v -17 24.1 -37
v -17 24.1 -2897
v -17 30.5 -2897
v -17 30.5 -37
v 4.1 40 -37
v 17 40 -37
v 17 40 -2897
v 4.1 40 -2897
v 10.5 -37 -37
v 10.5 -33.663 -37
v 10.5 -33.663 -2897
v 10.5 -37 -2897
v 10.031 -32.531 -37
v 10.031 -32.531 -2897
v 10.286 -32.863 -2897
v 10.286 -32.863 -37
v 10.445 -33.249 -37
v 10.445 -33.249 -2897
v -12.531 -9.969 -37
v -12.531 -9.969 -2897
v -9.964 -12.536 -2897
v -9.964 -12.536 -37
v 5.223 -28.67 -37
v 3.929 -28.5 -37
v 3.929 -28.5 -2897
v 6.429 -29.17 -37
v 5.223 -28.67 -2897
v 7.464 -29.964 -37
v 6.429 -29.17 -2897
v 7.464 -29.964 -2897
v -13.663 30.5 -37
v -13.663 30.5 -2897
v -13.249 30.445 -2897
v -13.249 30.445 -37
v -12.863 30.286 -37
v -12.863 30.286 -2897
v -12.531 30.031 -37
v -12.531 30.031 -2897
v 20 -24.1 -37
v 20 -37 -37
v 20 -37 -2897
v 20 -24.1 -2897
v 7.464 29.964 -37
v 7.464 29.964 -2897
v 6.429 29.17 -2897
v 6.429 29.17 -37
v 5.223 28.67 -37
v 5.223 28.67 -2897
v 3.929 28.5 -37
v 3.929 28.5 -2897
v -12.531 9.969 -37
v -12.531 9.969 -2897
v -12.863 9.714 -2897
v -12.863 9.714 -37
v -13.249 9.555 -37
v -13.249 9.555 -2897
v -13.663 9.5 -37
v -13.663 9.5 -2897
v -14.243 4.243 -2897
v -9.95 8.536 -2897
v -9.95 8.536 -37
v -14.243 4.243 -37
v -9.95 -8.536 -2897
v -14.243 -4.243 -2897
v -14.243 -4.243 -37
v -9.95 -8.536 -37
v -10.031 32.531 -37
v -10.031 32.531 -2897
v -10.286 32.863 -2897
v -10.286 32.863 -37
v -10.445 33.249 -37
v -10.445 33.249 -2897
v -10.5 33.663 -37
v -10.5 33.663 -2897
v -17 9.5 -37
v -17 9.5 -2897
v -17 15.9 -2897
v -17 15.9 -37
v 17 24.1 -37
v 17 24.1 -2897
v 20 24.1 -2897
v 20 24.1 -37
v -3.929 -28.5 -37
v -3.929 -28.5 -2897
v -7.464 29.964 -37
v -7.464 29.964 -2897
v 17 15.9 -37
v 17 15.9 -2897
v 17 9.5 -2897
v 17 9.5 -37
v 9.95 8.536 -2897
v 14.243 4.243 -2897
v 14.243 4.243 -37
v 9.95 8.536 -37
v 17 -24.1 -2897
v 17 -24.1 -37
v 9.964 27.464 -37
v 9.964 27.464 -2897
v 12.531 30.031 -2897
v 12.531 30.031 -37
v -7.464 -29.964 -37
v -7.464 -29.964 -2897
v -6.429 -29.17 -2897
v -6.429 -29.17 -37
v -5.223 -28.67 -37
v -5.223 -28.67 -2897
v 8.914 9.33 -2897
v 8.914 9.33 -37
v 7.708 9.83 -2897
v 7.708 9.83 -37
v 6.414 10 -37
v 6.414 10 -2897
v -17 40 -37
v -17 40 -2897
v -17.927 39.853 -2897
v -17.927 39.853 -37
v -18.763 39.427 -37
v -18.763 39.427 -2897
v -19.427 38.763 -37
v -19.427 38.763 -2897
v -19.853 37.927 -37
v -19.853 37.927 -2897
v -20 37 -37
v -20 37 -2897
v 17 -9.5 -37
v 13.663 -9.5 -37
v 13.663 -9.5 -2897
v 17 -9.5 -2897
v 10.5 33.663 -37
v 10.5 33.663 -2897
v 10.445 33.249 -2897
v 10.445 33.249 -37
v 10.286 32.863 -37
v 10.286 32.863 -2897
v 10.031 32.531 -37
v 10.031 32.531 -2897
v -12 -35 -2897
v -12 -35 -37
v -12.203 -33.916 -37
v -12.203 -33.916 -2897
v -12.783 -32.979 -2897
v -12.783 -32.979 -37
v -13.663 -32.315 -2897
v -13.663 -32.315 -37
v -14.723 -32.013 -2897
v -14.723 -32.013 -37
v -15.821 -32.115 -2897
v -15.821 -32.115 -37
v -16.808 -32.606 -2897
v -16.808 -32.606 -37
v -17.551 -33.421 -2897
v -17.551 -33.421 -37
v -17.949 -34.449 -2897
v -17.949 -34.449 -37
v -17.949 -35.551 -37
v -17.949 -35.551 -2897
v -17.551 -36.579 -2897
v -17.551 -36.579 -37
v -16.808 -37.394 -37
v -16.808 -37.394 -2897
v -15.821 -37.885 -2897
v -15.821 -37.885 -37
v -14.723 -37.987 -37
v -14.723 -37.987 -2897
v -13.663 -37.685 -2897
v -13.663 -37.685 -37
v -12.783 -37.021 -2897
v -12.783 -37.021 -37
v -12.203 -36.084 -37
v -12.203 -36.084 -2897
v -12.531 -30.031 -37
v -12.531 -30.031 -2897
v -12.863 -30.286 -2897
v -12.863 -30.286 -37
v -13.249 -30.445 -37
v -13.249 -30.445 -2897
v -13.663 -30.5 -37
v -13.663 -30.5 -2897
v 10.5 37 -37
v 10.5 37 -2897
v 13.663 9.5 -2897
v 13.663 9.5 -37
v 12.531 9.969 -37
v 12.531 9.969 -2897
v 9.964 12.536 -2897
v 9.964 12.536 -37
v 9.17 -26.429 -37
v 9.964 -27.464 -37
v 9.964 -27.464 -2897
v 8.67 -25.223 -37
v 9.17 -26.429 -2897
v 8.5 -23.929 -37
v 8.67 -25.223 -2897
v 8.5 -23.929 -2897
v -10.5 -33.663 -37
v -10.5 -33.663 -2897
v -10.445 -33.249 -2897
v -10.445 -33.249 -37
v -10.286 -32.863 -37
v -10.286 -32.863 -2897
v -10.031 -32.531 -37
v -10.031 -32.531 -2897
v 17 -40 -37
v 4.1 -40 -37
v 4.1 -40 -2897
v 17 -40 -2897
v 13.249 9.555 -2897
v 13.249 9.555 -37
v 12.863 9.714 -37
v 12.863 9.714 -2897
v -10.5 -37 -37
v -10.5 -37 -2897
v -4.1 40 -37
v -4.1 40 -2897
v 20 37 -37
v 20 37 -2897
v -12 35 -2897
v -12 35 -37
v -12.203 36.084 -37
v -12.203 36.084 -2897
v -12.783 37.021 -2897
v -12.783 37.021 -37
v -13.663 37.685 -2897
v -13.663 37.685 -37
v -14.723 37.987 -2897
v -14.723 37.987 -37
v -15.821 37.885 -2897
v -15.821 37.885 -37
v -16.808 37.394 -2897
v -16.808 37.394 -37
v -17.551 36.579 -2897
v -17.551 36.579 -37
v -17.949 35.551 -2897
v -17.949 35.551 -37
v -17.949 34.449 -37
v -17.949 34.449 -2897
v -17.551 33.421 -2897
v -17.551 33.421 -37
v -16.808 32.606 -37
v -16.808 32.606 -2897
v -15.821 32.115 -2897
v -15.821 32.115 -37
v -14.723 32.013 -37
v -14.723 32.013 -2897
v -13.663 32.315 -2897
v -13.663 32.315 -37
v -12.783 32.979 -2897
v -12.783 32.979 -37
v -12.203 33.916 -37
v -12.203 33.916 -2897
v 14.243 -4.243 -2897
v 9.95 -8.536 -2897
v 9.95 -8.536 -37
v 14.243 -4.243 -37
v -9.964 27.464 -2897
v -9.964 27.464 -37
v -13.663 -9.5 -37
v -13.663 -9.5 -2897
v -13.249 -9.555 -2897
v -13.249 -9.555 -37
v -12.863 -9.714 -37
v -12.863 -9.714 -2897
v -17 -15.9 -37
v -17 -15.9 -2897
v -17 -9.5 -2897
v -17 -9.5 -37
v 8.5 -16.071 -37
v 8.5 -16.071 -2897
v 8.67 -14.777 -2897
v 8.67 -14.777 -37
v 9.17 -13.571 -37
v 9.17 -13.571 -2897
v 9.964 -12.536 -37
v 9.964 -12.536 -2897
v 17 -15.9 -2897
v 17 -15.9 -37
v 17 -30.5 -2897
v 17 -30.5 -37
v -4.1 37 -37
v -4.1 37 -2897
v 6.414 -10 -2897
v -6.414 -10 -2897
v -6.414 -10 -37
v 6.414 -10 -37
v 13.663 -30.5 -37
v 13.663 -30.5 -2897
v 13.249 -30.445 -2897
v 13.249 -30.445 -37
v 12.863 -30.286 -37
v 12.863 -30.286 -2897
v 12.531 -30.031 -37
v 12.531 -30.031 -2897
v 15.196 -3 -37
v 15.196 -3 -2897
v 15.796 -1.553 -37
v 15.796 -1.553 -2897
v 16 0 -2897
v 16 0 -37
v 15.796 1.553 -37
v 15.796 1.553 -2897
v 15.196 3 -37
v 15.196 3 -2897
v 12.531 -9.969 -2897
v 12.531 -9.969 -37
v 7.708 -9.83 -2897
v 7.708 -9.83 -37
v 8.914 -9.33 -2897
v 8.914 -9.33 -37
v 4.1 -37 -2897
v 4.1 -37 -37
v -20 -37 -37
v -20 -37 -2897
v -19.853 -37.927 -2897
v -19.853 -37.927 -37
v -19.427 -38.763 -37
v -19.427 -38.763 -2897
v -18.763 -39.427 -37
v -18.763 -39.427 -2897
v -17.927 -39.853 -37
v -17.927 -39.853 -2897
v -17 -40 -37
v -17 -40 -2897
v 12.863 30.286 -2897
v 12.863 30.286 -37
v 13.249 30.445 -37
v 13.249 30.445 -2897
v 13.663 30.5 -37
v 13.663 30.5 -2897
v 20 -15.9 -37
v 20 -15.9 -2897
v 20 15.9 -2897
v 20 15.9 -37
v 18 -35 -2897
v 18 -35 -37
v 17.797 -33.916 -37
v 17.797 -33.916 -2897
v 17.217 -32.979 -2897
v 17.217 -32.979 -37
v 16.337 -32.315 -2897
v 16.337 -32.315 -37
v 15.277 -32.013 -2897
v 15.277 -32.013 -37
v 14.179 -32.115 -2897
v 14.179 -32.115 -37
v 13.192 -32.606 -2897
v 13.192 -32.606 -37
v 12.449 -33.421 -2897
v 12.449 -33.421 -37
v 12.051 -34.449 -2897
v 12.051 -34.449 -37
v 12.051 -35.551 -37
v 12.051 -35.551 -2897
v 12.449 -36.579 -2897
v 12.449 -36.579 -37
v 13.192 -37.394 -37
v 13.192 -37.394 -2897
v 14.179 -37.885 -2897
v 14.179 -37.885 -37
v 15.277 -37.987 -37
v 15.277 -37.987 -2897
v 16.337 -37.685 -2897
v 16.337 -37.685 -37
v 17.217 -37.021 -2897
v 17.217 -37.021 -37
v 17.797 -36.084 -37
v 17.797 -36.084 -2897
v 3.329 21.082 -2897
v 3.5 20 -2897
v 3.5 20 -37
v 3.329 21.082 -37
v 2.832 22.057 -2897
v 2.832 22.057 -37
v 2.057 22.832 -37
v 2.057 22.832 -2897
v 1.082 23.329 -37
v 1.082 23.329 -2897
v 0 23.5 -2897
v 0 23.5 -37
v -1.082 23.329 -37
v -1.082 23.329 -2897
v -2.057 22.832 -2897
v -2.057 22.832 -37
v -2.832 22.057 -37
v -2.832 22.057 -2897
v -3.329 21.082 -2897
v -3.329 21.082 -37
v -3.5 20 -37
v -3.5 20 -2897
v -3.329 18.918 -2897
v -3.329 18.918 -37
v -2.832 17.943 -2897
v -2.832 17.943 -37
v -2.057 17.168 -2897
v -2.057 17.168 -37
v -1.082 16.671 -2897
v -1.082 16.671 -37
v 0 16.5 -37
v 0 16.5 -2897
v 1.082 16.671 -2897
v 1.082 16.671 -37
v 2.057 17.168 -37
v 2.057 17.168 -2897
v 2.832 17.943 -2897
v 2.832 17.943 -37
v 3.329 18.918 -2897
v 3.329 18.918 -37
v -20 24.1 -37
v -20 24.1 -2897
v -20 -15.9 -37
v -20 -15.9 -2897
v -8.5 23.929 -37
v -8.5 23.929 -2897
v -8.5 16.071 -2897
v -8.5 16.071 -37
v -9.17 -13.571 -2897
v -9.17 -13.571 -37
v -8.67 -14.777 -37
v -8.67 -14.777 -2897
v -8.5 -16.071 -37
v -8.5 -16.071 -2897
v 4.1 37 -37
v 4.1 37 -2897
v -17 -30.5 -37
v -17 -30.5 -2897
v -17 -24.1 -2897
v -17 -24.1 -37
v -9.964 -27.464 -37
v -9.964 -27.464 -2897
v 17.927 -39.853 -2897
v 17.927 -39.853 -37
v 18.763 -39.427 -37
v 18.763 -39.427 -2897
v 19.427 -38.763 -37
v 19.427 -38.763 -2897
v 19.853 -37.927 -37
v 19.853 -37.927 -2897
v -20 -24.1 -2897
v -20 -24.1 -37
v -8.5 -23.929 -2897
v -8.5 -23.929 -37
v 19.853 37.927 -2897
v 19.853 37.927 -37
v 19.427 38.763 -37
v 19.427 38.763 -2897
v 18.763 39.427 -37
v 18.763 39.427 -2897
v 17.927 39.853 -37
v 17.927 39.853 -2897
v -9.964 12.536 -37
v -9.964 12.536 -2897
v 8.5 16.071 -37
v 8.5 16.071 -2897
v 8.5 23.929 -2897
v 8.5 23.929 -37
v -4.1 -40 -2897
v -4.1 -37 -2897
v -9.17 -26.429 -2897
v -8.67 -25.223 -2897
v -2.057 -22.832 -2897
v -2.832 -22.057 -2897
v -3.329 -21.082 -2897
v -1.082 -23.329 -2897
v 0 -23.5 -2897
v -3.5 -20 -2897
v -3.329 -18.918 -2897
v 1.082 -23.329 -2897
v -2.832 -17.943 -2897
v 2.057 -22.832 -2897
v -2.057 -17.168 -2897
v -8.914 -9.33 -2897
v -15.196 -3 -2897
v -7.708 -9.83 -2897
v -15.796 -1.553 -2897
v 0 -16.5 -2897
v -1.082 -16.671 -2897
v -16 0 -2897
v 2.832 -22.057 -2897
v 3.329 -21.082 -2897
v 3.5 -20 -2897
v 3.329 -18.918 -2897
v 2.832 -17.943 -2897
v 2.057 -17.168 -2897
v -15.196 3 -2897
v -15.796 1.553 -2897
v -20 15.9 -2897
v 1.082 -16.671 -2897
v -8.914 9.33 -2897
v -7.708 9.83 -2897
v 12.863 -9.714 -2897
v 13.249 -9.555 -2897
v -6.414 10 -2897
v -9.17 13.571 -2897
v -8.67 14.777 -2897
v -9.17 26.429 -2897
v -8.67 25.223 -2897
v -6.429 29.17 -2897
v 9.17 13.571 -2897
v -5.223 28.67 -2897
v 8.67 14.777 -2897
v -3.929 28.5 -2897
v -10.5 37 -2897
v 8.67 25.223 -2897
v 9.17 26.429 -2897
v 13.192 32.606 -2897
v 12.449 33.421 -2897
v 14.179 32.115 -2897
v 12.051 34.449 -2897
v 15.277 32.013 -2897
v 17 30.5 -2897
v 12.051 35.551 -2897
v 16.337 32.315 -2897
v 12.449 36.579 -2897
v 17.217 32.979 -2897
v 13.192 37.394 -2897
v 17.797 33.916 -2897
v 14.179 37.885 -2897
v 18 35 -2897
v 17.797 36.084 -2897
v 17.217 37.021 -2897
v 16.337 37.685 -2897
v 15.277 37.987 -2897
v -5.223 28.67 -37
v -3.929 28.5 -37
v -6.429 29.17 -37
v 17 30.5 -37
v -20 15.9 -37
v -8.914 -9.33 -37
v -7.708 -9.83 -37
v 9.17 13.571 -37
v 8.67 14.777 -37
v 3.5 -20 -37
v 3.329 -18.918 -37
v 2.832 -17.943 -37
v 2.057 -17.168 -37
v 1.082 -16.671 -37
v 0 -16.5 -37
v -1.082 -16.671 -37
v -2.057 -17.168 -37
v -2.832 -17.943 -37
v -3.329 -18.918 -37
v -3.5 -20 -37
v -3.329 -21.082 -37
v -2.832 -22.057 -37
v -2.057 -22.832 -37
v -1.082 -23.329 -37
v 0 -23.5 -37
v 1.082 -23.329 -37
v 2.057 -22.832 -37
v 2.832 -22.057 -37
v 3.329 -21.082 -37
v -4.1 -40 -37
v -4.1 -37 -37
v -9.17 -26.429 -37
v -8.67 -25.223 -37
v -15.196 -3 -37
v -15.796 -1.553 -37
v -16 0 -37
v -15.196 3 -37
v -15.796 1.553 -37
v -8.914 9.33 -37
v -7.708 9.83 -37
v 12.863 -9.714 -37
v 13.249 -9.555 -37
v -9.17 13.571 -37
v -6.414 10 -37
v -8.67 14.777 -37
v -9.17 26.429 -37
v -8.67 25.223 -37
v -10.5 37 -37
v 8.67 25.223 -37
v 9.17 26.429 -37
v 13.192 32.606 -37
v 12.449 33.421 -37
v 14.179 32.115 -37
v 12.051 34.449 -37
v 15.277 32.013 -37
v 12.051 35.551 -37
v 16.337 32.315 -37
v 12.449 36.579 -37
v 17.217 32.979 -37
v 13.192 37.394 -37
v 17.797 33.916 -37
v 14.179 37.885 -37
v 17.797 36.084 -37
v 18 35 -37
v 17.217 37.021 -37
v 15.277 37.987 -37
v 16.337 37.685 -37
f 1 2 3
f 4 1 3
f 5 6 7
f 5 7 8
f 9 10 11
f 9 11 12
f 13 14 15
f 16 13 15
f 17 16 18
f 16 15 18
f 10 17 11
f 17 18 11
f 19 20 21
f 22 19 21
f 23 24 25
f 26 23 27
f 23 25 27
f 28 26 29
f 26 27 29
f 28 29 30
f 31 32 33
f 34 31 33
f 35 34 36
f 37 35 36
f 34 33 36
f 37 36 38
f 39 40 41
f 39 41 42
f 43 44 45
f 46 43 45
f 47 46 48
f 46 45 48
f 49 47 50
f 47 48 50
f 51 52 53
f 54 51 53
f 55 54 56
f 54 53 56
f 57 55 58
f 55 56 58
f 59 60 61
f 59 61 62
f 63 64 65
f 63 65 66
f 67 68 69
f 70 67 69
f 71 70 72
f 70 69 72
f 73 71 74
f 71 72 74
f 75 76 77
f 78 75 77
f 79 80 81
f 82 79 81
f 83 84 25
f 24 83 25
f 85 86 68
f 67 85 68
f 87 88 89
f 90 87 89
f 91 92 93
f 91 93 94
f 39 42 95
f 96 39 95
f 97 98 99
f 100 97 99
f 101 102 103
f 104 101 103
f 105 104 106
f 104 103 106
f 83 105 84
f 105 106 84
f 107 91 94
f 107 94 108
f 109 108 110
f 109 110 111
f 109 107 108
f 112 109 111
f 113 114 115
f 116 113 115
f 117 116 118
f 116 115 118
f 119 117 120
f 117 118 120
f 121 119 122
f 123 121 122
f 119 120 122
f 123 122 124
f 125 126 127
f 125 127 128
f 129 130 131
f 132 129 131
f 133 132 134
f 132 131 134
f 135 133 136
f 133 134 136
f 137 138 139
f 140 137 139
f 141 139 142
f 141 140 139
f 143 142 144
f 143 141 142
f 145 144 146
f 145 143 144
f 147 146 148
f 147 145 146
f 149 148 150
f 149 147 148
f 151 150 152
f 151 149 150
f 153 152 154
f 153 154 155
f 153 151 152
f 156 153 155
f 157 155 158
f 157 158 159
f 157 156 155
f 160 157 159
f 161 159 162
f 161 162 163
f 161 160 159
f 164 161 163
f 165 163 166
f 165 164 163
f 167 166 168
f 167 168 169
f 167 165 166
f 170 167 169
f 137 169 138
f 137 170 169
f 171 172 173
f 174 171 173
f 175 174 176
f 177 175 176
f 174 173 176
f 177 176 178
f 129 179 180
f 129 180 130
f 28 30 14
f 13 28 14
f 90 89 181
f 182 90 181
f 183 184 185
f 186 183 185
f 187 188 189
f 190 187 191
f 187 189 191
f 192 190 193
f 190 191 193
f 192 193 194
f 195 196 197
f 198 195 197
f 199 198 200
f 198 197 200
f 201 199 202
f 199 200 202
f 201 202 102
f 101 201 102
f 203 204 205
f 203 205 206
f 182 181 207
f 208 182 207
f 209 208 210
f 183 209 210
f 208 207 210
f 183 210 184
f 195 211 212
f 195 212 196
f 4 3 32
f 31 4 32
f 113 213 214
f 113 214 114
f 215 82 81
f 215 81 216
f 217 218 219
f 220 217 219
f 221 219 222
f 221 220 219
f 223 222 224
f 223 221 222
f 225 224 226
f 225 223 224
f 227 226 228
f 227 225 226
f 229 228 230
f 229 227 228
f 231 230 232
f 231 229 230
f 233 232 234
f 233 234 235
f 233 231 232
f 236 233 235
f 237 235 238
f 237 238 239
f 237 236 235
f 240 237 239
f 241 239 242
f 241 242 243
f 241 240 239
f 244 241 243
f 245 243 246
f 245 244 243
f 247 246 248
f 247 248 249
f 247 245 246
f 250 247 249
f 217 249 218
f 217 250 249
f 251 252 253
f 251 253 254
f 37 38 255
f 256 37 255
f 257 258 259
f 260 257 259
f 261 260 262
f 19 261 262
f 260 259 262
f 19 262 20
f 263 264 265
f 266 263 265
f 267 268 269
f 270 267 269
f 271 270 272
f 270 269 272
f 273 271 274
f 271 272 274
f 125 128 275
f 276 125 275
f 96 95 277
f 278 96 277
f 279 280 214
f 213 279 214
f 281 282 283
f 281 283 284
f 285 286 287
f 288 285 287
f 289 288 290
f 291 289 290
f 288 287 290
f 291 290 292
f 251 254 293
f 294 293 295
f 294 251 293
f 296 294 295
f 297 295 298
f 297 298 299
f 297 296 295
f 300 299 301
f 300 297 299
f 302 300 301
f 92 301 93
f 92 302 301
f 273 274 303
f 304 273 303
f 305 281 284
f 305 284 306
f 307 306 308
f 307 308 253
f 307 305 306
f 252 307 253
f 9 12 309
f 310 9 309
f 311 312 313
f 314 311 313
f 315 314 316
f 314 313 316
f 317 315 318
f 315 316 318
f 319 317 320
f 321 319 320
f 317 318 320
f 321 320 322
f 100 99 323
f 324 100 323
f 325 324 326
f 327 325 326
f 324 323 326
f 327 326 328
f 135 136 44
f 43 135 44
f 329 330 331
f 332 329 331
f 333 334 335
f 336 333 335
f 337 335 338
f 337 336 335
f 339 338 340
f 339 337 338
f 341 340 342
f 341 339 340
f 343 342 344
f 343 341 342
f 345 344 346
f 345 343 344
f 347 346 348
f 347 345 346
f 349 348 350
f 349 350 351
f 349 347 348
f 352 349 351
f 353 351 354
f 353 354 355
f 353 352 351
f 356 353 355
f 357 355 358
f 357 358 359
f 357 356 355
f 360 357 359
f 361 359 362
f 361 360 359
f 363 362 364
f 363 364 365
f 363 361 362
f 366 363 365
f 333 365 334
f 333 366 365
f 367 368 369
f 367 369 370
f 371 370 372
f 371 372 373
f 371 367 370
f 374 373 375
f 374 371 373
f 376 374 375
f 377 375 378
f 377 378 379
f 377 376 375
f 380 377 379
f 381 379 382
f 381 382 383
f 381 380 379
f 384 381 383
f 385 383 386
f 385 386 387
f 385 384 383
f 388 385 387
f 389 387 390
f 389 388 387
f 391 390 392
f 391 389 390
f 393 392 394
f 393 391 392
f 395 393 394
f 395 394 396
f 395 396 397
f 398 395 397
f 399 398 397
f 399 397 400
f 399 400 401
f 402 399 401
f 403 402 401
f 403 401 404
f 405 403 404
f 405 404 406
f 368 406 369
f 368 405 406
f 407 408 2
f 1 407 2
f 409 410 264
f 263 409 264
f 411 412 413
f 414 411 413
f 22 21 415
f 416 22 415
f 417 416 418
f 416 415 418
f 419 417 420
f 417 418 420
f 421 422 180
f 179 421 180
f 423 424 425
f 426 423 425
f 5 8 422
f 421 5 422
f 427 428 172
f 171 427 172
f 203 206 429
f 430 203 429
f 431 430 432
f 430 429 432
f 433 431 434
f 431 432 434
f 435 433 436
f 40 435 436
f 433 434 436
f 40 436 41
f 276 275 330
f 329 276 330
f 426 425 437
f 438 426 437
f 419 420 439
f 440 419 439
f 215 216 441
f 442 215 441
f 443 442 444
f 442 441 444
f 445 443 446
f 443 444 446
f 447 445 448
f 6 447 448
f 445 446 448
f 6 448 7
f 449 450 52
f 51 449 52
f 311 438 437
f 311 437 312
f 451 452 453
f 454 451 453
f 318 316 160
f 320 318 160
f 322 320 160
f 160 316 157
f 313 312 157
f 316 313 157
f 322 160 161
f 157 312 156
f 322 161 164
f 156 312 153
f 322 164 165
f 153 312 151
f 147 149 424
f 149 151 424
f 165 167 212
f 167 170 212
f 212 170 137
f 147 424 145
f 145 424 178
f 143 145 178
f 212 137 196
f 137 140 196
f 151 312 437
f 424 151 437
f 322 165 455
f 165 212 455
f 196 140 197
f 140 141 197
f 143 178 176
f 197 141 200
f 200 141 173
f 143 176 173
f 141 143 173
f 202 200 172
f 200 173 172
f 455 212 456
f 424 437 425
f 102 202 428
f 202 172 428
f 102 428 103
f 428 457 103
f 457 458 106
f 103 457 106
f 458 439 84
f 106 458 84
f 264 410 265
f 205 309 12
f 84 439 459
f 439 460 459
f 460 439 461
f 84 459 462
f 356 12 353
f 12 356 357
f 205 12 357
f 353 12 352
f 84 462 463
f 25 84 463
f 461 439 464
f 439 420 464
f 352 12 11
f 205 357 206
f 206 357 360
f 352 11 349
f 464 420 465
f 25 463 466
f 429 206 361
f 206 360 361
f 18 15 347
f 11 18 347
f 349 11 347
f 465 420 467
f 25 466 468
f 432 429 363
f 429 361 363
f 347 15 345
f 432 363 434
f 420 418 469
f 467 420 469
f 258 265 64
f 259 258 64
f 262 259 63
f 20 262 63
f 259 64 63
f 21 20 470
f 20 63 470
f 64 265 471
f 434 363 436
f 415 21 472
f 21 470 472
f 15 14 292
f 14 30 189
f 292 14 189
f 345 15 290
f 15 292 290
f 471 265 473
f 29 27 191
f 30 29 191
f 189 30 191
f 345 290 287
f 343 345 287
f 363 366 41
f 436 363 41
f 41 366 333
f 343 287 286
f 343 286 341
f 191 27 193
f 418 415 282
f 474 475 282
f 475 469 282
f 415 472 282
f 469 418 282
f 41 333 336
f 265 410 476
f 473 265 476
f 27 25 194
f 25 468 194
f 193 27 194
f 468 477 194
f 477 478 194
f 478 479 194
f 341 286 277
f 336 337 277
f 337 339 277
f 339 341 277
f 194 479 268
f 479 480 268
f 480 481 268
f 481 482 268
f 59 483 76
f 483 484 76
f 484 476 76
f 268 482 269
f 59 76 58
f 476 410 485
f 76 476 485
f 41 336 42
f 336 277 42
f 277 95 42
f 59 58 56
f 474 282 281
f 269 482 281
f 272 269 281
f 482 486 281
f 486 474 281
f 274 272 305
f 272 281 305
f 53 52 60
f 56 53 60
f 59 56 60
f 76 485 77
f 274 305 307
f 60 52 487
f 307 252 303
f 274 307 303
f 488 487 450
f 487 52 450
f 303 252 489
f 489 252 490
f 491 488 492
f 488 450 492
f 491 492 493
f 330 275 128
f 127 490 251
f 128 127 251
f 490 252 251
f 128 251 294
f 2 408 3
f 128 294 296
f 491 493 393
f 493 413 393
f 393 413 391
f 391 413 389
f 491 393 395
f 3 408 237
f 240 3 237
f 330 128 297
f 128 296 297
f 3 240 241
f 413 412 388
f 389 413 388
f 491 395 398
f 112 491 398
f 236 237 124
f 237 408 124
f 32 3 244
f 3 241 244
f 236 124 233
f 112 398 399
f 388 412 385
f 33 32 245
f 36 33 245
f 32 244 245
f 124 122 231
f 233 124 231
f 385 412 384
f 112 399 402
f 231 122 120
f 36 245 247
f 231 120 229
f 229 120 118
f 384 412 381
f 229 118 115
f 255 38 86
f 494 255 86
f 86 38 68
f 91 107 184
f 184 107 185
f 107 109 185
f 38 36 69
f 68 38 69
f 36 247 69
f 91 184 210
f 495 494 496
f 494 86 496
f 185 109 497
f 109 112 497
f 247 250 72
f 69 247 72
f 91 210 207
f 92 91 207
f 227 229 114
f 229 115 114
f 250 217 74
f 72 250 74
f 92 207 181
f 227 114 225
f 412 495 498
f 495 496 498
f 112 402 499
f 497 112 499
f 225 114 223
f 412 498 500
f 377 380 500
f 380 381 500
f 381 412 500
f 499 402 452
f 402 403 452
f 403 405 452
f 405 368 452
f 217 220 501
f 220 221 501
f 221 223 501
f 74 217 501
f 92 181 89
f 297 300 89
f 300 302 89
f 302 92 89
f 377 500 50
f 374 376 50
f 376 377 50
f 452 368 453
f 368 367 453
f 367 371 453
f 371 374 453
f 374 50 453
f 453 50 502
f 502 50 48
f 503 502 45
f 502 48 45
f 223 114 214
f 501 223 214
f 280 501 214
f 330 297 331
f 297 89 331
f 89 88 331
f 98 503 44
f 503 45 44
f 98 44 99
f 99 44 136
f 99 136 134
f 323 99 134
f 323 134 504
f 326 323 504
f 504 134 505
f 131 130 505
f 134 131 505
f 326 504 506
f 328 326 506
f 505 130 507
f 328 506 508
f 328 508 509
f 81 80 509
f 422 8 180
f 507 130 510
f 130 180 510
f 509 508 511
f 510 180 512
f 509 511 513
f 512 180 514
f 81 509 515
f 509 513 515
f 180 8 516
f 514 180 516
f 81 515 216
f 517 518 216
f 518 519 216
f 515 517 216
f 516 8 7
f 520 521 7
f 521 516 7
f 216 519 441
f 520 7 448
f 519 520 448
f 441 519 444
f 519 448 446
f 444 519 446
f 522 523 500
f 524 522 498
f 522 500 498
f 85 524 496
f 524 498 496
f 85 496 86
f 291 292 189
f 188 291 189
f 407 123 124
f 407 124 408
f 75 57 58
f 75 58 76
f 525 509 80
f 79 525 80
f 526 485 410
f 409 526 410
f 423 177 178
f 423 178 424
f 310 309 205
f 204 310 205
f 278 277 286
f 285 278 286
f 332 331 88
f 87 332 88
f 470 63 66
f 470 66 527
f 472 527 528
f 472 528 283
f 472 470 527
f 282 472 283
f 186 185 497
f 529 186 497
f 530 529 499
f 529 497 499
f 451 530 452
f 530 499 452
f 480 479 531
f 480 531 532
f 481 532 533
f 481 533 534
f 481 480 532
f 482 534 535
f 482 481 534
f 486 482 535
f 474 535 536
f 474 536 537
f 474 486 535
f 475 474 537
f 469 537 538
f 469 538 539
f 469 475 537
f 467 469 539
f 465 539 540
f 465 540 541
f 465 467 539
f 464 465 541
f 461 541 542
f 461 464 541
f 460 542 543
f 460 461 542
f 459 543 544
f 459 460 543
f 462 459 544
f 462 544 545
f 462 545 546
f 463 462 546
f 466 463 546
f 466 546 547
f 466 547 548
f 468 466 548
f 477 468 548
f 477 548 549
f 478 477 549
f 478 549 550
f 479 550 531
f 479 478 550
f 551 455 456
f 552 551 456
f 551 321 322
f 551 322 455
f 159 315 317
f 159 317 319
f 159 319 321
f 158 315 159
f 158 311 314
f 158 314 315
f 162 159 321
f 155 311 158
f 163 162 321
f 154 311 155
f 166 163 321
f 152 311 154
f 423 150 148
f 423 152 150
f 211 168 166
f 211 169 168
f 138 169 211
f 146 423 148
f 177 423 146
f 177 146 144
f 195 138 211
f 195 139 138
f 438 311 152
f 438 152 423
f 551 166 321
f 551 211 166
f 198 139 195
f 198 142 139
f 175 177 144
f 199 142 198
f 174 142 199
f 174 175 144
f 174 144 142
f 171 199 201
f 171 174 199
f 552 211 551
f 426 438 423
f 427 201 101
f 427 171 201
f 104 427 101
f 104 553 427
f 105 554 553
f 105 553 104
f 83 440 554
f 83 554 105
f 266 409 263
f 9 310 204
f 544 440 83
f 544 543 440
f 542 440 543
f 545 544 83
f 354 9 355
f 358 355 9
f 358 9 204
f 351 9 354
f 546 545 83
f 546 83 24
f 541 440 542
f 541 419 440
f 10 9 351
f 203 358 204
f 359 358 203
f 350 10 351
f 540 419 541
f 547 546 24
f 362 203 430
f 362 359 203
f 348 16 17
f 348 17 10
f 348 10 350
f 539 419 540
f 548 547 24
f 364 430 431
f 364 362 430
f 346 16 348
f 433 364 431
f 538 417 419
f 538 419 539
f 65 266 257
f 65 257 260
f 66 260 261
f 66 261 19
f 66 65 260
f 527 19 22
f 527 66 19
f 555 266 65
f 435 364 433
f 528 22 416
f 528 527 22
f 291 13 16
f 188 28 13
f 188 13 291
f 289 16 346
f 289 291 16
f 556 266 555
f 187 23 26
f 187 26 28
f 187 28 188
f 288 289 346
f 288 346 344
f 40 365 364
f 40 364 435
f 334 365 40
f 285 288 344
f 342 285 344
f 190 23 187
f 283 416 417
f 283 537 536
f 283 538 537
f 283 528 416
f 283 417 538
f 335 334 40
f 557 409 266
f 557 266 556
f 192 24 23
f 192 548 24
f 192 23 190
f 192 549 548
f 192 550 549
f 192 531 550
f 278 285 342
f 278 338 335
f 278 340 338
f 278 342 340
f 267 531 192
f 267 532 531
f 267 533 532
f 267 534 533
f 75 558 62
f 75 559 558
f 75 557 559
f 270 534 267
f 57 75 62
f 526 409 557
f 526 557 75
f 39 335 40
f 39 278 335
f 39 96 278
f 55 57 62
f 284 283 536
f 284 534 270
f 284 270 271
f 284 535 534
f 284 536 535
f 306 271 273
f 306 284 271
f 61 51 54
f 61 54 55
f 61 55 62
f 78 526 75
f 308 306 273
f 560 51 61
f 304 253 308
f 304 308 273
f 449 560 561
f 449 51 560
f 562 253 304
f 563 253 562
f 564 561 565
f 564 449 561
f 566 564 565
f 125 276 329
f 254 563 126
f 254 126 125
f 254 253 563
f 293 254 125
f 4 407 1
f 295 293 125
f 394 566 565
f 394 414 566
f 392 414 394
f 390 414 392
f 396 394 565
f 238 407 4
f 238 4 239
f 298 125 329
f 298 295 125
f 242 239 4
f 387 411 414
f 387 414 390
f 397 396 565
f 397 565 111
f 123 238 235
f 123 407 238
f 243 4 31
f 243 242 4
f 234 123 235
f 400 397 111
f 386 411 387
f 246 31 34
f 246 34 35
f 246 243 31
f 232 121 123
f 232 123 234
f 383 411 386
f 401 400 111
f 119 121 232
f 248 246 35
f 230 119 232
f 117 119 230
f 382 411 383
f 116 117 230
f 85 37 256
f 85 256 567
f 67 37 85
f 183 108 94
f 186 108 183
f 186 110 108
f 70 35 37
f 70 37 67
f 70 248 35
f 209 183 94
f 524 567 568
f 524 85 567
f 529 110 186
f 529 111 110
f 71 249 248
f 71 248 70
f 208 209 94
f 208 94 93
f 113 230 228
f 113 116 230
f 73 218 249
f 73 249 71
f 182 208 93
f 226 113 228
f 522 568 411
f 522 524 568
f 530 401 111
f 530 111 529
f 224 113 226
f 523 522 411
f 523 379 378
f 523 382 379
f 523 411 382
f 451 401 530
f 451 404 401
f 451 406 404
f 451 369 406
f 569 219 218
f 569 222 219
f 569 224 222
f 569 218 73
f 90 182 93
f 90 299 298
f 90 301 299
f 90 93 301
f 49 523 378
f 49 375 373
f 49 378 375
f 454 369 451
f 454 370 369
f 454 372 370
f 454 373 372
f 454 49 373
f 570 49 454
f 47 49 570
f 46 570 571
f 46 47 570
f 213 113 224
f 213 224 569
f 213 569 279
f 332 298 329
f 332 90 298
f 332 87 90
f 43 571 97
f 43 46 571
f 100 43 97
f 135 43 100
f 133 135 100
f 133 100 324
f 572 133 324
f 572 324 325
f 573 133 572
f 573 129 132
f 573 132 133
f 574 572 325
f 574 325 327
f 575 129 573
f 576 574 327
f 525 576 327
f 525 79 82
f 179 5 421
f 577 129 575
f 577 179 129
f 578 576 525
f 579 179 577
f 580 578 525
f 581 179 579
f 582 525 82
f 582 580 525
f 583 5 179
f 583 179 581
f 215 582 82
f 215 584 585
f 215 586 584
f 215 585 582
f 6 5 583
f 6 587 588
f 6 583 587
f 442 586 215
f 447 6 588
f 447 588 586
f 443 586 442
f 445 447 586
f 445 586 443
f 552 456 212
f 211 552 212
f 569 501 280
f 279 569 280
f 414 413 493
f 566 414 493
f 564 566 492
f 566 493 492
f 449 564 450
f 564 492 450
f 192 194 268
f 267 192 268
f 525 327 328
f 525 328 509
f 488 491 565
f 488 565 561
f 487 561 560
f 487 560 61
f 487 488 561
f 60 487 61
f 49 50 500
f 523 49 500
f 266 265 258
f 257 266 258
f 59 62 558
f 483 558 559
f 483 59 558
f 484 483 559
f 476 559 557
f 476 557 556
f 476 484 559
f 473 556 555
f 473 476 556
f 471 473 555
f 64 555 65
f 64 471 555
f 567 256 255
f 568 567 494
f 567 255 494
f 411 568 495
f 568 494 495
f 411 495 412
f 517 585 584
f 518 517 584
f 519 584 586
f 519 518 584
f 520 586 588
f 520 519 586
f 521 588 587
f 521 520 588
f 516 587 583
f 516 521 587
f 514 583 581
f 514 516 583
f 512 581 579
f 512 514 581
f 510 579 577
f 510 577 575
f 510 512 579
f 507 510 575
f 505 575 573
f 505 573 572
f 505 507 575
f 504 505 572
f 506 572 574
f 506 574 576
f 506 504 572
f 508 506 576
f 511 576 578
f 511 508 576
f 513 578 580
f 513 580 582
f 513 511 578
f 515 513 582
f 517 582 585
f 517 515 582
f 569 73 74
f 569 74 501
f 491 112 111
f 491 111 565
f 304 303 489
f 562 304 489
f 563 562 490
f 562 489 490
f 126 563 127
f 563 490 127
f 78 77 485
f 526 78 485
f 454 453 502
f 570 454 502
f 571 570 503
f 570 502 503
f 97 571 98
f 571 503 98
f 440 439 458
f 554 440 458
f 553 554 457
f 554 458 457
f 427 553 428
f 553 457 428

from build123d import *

# Parameters (mm, degrees)
SKETCH1_R           = 3
SKETCH1_R_2         = 3.5
BOSS_EXTRUDE1_DEPTH = 2860


with BuildPart() as part:
    # Sketch1 → Boss-Extrude1 (new body)
    with BuildSketch(Plane.XY.offset(-2897)):
        with BuildLine():
            Line((-17, -40), (-4.1, -40))
            Line((-4.1, -40), (-4.1, -37))
            Line((-4.1, -37), (-10.5, -37))
            Line((-10.5, -37), (-10.5, -33.6627417))
            ThreePointArc((-10.5, -33.6627417), (-10.378207252, -33.050448208), (-10.03137085, -32.53137085))
            Line((-10.03137085, -32.53137085), (-7.464466094, -29.964466094))
            ThreePointArc((-7.464466094, -29.964466094), (-5.84234935, -28.880602337), (-3.928932188, -28.5))
            Line((-3.928932188, -28.5), (3.928932188, -28.5))
            ThreePointArc((3.928932188, -28.5), (5.84234935, -28.880602337), (7.464466094, -29.964466094))
            Line((7.464466094, -29.964466094), (10.03137085, -32.53137085))
            ThreePointArc((10.03137085, -32.53137085), (10.378207252, -33.050448208), (10.5, -33.6627417))
            Line((10.5, -33.6627417), (10.5, -37))
            Line((10.5, -37), (4.1, -37))
            Line((4.1, -37), (4.1, -40))
            Line((4.1, -40), (17, -40))
            ThreePointArc((17, -40), (19.121320344, -39.121320344), (20, -37))
            Line((20, -37), (20, -24.1))
            Line((20, -24.1), (17, -24.1))
            Line((17, -24.1), (17, -30.5))
            Line((17, -30.5), (13.6627417, -30.5))
            ThreePointArc((13.6627417, -30.5), (13.050448208, -30.378207252), (12.53137085, -30.03137085))
            Line((12.53137085, -30.03137085), (9.964466094, -27.464466094))
            ThreePointArc((9.964466094, -27.464466094), (8.880602337, -25.84234935), (8.5, -23.928932188))
            Line((8.5, -23.928932188), (8.5, -16.071067812))
            ThreePointArc((8.5, -16.071067812), (8.880602337, -14.15765065), (9.964466094, -12.535533906))
            Line((9.964466094, -12.535533906), (12.53137085, -9.96862915))
            ThreePointArc((12.53137085, -9.96862915), (13.050448208, -9.621792748), (13.6627417, -9.5))
            Line((13.6627417, -9.5), (17, -9.5))
            Line((17, -9.5), (17, -15.9))
            Line((17, -15.9), (20, -15.9))
            Line((20, -15.9), (20, 15.9))
            Line((20, 15.9), (17, 15.9))
            Line((17, 15.9), (17, 9.5))
            Line((17, 9.5), (13.6627417, 9.5))
            ThreePointArc((13.6627417, 9.5), (13.050448208, 9.621792748), (12.53137085, 9.96862915))
            Line((12.53137085, 9.96862915), (9.964466094, 12.535533906))
            ThreePointArc((9.964466094, 12.535533906), (8.880602337, 14.15765065), (8.5, 16.071067812))
            Line((8.5, 16.071067812), (8.5, 23.928932188))
            ThreePointArc((8.5, 23.928932188), (8.880602337, 25.84234935), (9.964466094, 27.464466094))
            Line((9.964466094, 27.464466094), (12.53137085, 30.03137085))
            ThreePointArc((12.53137085, 30.03137085), (13.050448208, 30.378207252), (13.6627417, 30.5))
            Line((13.6627417, 30.5), (17, 30.5))
            Line((17, 30.5), (17, 24.1))
            Line((17, 24.1), (20, 24.1))
            Line((20, 24.1), (20, 37))
            ThreePointArc((20, 37), (19.121320344, 39.121320344), (17, 40))
            Line((17, 40), (4.1, 40))
            Line((4.1, 40), (4.1, 37))
            Line((4.1, 37), (10.5, 37))
            Line((10.5, 37), (10.5, 33.6627417))
            ThreePointArc((10.5, 33.6627417), (10.378207252, 33.050448208), (10.03137085, 32.53137085))
            Line((10.03137085, 32.53137085), (7.464466094, 29.964466094))
            ThreePointArc((7.464466094, 29.964466094), (5.84234935, 28.880602337), (3.928932188, 28.5))
            Line((3.928932188, 28.5), (-3.928932188, 28.5))
            ThreePointArc((-3.928932188, 28.5), (-5.84234935, 28.880602337), (-7.464466094, 29.964466094))
            Line((-7.464466094, 29.964466094), (-10.03137085, 32.53137085))
            ThreePointArc((-10.03137085, 32.53137085), (-10.378207252, 33.050448208), (-10.5, 33.6627417))
            Line((-10.5, 33.6627417), (-10.5, 37))
            Line((-10.5, 37), (-4.1, 37))
            Line((-4.1, 37), (-4.1, 40))
            Line((-4.1, 40), (-17, 40))
            ThreePointArc((-17, 40), (-19.121320344, 39.121320344), (-20, 37))
            Line((-20, 37), (-20, 24.1))
            Line((-20, 24.1), (-17, 24.1))
            Line((-17, 24.1), (-17, 30.5))
            Line((-17, 30.5), (-13.6627417, 30.5))
            ThreePointArc((-13.6627417, 30.5), (-13.050448208, 30.378207252), (-12.53137085, 30.03137085))
            Line((-12.53137085, 30.03137085), (-9.964466094, 27.464466094))
            ThreePointArc((-9.964466094, 27.464466094), (-8.880602337, 25.84234935), (-8.5, 23.928932188))
            Line((-8.5, 23.928932188), (-8.5, 16.071067812))
            ThreePointArc((-8.5, 16.071067812), (-8.880602337, 14.15765065), (-9.964466094, 12.535533906))
            Line((-9.964466094, 12.535533906), (-12.53137085, 9.96862915))
            ThreePointArc((-12.53137085, 9.96862915), (-13.050448208, 9.621792748), (-13.6627417, 9.5))
            Line((-13.6627417, 9.5), (-17, 9.5))
            Line((-17, 9.5), (-17, 15.9))
            Line((-17, 15.9), (-20, 15.9))
            Line((-20, 15.9), (-20, -15.9))
            Line((-20, -15.9), (-17, -15.9))
            Line((-17, -15.9), (-17, -9.5))
            Line((-17, -9.5), (-13.6627417, -9.5))
            ThreePointArc((-13.6627417, -9.5), (-13.050448208, -9.621792748), (-12.53137085, -9.96862915))
            Line((-12.53137085, -9.96862915), (-9.964466094, -12.535533906))
            ThreePointArc((-9.964466094, -12.535533906), (-8.880602337, -14.15765065), (-8.5, -16.071067812))
            Line((-8.5, -16.071067812), (-8.5, -23.928932188))
            ThreePointArc((-8.5, -23.928932188), (-8.880602337, -25.84234935), (-9.964466094, -27.464466094))
            Line((-9.964466094, -27.464466094), (-12.53137085, -30.03137085))
            ThreePointArc((-12.53137085, -30.03137085), (-13.050448208, -30.378207252), (-13.6627417, -30.5))
            Line((-13.6627417, -30.5), (-17, -30.5))
            Line((-17, -30.5), (-17, -24.1))
            Line((-17, -24.1), (-20, -24.1))
            Line((-20, -24.1), (-20, -37))
            ThreePointArc((-20, -37), (-19.121320344, -39.121320344), (-17, -40))
        make_face()
        with Locations((15, 35)):
            Circle(SKETCH1_R, mode=Mode.SUBTRACT)
        with Locations((15, -35)):
            Circle(SKETCH1_R, mode=Mode.SUBTRACT)
        with Locations((0, 20)):
            Circle(SKETCH1_R_2, mode=Mode.SUBTRACT)
        with Locations((0, -20)):
            Circle(SKETCH1_R_2, mode=Mode.SUBTRACT)
        with Locations((-15, 35)):
            Circle(SKETCH1_R, mode=Mode.SUBTRACT)
        with Locations((-15, -35)):
            Circle(SKETCH1_R, mode=Mode.SUBTRACT)
        with BuildLine():
            Line((-14.242640687, -4.242640687), (-9.949747468, -8.535533906))
            ThreePointArc((-9.949747468, -8.535533906), (-8.327630724, -9.619397663), (-6.414213562, -10))
            Line((-6.414213562, -10), (6.414213562, -10))
            ThreePointArc((6.414213562, -10), (8.327630724, -9.619397663), (9.949747468, -8.535533906))
            Line((9.949747468, -8.535533906), (14.242640687, -4.242640687))
            ThreePointArc((14.242640687, -4.242640687), (16, 0), (14.242640687, 4.242640687))
            Line((14.242640687, 4.242640687), (9.949747468, 8.535533906))
            ThreePointArc((9.949747468, 8.535533906), (8.327630724, 9.619397663), (6.414213562, 10))
            Line((6.414213562, 10), (-6.414213562, 10))
            ThreePointArc((-6.414213562, 10), (-8.327630724, 9.619397663), (-9.949747468, 8.535533906))
            Line((-9.949747468, 8.535533906), (-14.242640687, 4.242640687))
            ThreePointArc((-14.242640687, 4.242640687), (-16, 0), (-14.242640687, -4.242640687))
        make_face(mode=Mode.SUBTRACT)
    extrude(amount=BOSS_EXTRUDE1_DEPTH)


solid = part.part
